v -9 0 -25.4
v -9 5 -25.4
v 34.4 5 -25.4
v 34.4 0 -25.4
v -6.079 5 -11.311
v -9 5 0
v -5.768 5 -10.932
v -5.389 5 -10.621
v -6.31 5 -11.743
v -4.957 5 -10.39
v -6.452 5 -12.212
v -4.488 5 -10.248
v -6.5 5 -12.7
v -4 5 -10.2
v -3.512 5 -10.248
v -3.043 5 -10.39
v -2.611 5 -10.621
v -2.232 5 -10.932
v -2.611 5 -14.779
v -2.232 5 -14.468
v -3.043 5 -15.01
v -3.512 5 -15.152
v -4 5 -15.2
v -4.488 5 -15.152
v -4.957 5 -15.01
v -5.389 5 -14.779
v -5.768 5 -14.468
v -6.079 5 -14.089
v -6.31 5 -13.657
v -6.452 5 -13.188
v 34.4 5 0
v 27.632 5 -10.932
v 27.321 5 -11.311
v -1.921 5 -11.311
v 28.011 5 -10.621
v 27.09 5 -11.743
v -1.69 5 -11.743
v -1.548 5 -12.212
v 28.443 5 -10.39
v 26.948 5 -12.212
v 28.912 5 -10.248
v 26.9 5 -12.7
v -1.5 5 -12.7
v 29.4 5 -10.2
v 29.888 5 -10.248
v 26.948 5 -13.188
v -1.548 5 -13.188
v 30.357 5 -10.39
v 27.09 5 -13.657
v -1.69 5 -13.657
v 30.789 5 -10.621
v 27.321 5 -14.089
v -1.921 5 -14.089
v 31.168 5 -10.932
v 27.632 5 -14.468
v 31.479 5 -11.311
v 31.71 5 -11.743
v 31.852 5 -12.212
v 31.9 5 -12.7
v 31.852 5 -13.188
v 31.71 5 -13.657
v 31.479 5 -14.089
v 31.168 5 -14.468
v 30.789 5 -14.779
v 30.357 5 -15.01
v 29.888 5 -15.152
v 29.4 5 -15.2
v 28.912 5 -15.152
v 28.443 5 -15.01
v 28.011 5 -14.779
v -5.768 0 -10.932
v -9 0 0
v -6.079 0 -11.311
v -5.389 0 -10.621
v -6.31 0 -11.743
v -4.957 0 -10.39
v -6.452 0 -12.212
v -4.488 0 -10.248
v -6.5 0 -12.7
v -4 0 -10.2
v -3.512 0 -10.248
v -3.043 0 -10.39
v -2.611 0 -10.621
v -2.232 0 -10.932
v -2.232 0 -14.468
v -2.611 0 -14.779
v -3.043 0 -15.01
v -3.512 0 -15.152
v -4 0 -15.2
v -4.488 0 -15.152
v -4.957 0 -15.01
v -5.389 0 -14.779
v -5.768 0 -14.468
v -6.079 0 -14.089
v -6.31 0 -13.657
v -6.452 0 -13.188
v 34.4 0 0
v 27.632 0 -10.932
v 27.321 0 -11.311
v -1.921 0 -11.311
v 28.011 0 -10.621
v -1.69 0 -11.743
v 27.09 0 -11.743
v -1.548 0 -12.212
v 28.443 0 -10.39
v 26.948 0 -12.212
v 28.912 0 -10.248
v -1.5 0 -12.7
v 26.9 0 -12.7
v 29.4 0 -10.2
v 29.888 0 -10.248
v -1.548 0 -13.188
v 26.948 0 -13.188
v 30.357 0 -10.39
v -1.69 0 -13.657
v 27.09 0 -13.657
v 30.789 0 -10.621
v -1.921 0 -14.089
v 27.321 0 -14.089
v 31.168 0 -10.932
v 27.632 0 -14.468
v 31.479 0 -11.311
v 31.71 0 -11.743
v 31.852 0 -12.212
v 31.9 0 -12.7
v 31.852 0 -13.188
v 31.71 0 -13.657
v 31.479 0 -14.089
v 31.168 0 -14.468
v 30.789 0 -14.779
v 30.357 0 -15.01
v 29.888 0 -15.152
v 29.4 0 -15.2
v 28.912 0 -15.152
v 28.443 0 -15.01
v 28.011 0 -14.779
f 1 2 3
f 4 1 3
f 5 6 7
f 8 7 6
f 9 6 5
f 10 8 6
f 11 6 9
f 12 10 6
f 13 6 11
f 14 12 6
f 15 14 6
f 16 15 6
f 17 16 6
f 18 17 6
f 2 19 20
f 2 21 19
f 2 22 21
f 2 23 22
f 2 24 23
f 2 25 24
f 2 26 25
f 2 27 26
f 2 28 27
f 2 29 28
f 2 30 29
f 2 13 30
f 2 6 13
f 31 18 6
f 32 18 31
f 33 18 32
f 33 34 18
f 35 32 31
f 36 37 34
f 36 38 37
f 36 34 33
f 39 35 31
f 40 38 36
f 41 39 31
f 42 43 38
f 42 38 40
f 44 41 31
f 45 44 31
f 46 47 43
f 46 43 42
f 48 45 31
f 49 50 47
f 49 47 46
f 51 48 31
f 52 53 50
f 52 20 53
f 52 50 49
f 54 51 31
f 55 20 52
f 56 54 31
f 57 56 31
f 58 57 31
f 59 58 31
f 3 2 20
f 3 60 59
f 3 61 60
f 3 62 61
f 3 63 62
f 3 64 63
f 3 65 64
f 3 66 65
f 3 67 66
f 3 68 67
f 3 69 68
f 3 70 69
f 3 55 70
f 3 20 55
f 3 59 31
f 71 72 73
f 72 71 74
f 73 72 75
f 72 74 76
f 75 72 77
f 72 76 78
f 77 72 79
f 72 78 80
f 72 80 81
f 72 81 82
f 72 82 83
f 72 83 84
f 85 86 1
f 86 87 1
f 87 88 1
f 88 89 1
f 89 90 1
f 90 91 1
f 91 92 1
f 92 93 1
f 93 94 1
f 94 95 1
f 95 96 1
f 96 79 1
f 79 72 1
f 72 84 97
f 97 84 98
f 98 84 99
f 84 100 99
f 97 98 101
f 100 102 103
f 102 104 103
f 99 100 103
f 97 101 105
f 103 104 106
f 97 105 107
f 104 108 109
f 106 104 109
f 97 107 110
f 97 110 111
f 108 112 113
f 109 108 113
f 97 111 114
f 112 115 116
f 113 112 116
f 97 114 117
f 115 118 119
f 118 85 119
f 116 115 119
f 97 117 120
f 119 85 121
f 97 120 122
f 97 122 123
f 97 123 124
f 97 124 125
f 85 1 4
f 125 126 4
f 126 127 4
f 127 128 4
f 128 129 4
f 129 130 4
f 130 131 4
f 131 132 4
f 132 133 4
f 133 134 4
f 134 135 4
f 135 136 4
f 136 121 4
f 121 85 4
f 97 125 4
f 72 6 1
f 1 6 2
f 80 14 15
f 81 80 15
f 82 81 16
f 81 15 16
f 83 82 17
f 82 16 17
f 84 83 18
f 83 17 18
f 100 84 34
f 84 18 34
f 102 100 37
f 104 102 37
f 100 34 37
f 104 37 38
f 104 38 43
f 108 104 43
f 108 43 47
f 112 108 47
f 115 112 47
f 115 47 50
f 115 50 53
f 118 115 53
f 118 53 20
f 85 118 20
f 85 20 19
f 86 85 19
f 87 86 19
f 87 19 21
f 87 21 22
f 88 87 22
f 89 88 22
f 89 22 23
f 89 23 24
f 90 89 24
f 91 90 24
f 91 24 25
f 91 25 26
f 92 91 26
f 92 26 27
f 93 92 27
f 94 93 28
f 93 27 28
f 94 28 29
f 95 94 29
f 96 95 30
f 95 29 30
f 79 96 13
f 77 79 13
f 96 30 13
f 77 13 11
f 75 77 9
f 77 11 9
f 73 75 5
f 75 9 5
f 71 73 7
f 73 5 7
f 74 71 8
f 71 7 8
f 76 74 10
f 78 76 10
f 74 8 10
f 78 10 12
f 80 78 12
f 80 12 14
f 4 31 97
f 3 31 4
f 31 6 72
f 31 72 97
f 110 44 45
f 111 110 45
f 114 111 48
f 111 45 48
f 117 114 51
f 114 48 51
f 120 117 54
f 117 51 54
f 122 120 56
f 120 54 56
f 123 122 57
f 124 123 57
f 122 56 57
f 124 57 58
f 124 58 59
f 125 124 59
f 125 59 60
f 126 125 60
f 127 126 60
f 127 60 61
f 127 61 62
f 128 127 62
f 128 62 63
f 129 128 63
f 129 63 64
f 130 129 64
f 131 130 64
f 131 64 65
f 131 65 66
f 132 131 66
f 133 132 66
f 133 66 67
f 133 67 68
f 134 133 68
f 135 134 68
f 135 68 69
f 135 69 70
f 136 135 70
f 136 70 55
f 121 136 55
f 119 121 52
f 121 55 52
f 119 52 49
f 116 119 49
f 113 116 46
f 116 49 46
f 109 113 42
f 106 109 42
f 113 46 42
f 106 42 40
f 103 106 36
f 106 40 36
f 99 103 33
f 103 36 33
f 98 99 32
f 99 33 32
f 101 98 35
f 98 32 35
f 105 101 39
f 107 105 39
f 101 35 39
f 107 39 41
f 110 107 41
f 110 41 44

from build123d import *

# Parameters (mm, degrees)
SKETCH2_W           = 25.4
SKETCH2_H           = 25.4
BOSS_EXTRUDE6_DEPTH = 5
BOSS_EXTRUDE7_DEPTH = 5
FILLET1_R           = 5
SKETCH5_R           = 1
CUT_EXTRUDE1_DEPTH  = 5
SKETCH6_W           = 28.098270468
SKETCH6_H           = 9.80175879
CUT_EXTRUDE2_DEPTH  = 49.905214446
SKETCH7_W           = 43.4
SKETCH7_H           = 25.4
SKETCH7_R           = 2.5
BOSS_EXTRUDE8_DEPTH = 5
SKETCH8_R           = 2.5
CUT_EXTRUDE3_DEPTH  = 10


with BuildPart() as part:
    # Sketch2 → Boss-Extrude6 (new body)
    with BuildSketch(Plane(origin=(0, 0, 0), x_dir=(1, 0, 0), z_dir=(0, 1, 0))):
        with Locations((12.7, 12.7)):
            Rectangle(SKETCH2_W, SKETCH2_H)
    extrude(amount=BOSS_EXTRUDE6_DEPTH)

    # Sketch4 → Boss-Extrude7 (add)
    with BuildSketch(Plane.XZ):
        with BuildLine():
            Line((25.4, 0), (25.4, -9.7))
            ThreePointArc((25.4, -9.7), (34.4, -12.7), (25.4, -15.7))
            Line((25.4, -15.7), (25.4, -25.4))
            Line((25.4, -25.4), (15.7, -25.4))
            ThreePointArc((15.7, -25.4), (12.7, -34.4), (9.7, -25.4))
            Line((9.7, -25.4), (0, -25.4))
            Line((0, -25.4), (0, -15.7))
            ThreePointArc((0, -15.7), (-9, -12.7), (0, -9.7))
            Line((0, -9.7), (0, 0))
            Line((0, 0), (9.7, 0))
            Line((9.7, 0), (15.7, 0))
            Line((15.7, 0), (25.4, 0))
        make_face()
    extrude(amount=-BOSS_EXTRUDE7_DEPTH)

    # Fillet1
    fillet1_edges = [part.edges().sort_by_distance(p)[0] for p in [
        (25.4, 2.5, -9.7),
        (25.4, 2.5, -15.7),
        (15.7, 2.5, -25.4),
        (9.7, 2.5, -25.4),
        (0, 2.5, -15.7),
        (0, 2.5, -9.7),
    ]]
    fillet(fillet1_edges, radius=FILLET1_R)

    # Sketch5 → Cut-Extrude1 (cut)
    with BuildSketch(Plane(origin=(0, 5, 0), x_dir=(1, 0, 0), z_dir=(0, 1, 0))):
        with Locations(Location((-4, 12.7, 0), (0, 0, 270))):
            Circle(SKETCH5_R)
        with Locations(Location((12.7, 29.4, 0), (0, 0, 270))):
            Circle(SKETCH5_R)
        with Locations(Location((29.4, 12.7, 0), (0, 0, 270))):
            Circle(SKETCH5_R)
    extrude(amount=-CUT_EXTRUDE1_DEPTH, mode=Mode.SUBTRACT)

    # Sketch6 → Cut-Extrude2 (cut, through all)
    with BuildSketch(Plane(origin=(0, 5, 0), x_dir=(1, 0, 0), z_dir=(0, 1, 0))):
        with Locations((14.049135234, 30.300879395)):
            Rectangle(SKETCH6_W, SKETCH6_H)
    extrude(amount=-CUT_EXTRUDE2_DEPTH, mode=Mode.SUBTRACT)

    # Sketch7 → Boss-Extrude8 (add)
    with BuildSketch(Plane(origin=(0, 5, 0), x_dir=(1, 0, 0), z_dir=(0, 1, 0))):
        with Locations((12.7, 12.7)):
            Rectangle(SKETCH7_W, SKETCH7_H)
        with Locations((-4, 12.7)):
            Circle(SKETCH7_R, mode=Mode.SUBTRACT)
        with Locations((29.4, 12.7)):
            Circle(SKETCH7_R, mode=Mode.SUBTRACT)
    extrude(amount=-BOSS_EXTRUDE8_DEPTH)

    # Sketch8 → Cut-Extrude3 (cut)
    with BuildSketch(Plane(origin=(0, 5, 0), x_dir=(1, 0, 0), z_dir=(0, 1, 0))):
        with Locations(Location((-4, 12.7, 0), (0, 0, 270))):
            Circle(SKETCH8_R)
        with Locations(Location((29.4, 12.7, 0), (0, 0, 270))):
            Circle(SKETCH8_R)
    extrude(amount=-CUT_EXTRUDE3_DEPTH, mode=Mode.SUBTRACT)


solid = part.part
